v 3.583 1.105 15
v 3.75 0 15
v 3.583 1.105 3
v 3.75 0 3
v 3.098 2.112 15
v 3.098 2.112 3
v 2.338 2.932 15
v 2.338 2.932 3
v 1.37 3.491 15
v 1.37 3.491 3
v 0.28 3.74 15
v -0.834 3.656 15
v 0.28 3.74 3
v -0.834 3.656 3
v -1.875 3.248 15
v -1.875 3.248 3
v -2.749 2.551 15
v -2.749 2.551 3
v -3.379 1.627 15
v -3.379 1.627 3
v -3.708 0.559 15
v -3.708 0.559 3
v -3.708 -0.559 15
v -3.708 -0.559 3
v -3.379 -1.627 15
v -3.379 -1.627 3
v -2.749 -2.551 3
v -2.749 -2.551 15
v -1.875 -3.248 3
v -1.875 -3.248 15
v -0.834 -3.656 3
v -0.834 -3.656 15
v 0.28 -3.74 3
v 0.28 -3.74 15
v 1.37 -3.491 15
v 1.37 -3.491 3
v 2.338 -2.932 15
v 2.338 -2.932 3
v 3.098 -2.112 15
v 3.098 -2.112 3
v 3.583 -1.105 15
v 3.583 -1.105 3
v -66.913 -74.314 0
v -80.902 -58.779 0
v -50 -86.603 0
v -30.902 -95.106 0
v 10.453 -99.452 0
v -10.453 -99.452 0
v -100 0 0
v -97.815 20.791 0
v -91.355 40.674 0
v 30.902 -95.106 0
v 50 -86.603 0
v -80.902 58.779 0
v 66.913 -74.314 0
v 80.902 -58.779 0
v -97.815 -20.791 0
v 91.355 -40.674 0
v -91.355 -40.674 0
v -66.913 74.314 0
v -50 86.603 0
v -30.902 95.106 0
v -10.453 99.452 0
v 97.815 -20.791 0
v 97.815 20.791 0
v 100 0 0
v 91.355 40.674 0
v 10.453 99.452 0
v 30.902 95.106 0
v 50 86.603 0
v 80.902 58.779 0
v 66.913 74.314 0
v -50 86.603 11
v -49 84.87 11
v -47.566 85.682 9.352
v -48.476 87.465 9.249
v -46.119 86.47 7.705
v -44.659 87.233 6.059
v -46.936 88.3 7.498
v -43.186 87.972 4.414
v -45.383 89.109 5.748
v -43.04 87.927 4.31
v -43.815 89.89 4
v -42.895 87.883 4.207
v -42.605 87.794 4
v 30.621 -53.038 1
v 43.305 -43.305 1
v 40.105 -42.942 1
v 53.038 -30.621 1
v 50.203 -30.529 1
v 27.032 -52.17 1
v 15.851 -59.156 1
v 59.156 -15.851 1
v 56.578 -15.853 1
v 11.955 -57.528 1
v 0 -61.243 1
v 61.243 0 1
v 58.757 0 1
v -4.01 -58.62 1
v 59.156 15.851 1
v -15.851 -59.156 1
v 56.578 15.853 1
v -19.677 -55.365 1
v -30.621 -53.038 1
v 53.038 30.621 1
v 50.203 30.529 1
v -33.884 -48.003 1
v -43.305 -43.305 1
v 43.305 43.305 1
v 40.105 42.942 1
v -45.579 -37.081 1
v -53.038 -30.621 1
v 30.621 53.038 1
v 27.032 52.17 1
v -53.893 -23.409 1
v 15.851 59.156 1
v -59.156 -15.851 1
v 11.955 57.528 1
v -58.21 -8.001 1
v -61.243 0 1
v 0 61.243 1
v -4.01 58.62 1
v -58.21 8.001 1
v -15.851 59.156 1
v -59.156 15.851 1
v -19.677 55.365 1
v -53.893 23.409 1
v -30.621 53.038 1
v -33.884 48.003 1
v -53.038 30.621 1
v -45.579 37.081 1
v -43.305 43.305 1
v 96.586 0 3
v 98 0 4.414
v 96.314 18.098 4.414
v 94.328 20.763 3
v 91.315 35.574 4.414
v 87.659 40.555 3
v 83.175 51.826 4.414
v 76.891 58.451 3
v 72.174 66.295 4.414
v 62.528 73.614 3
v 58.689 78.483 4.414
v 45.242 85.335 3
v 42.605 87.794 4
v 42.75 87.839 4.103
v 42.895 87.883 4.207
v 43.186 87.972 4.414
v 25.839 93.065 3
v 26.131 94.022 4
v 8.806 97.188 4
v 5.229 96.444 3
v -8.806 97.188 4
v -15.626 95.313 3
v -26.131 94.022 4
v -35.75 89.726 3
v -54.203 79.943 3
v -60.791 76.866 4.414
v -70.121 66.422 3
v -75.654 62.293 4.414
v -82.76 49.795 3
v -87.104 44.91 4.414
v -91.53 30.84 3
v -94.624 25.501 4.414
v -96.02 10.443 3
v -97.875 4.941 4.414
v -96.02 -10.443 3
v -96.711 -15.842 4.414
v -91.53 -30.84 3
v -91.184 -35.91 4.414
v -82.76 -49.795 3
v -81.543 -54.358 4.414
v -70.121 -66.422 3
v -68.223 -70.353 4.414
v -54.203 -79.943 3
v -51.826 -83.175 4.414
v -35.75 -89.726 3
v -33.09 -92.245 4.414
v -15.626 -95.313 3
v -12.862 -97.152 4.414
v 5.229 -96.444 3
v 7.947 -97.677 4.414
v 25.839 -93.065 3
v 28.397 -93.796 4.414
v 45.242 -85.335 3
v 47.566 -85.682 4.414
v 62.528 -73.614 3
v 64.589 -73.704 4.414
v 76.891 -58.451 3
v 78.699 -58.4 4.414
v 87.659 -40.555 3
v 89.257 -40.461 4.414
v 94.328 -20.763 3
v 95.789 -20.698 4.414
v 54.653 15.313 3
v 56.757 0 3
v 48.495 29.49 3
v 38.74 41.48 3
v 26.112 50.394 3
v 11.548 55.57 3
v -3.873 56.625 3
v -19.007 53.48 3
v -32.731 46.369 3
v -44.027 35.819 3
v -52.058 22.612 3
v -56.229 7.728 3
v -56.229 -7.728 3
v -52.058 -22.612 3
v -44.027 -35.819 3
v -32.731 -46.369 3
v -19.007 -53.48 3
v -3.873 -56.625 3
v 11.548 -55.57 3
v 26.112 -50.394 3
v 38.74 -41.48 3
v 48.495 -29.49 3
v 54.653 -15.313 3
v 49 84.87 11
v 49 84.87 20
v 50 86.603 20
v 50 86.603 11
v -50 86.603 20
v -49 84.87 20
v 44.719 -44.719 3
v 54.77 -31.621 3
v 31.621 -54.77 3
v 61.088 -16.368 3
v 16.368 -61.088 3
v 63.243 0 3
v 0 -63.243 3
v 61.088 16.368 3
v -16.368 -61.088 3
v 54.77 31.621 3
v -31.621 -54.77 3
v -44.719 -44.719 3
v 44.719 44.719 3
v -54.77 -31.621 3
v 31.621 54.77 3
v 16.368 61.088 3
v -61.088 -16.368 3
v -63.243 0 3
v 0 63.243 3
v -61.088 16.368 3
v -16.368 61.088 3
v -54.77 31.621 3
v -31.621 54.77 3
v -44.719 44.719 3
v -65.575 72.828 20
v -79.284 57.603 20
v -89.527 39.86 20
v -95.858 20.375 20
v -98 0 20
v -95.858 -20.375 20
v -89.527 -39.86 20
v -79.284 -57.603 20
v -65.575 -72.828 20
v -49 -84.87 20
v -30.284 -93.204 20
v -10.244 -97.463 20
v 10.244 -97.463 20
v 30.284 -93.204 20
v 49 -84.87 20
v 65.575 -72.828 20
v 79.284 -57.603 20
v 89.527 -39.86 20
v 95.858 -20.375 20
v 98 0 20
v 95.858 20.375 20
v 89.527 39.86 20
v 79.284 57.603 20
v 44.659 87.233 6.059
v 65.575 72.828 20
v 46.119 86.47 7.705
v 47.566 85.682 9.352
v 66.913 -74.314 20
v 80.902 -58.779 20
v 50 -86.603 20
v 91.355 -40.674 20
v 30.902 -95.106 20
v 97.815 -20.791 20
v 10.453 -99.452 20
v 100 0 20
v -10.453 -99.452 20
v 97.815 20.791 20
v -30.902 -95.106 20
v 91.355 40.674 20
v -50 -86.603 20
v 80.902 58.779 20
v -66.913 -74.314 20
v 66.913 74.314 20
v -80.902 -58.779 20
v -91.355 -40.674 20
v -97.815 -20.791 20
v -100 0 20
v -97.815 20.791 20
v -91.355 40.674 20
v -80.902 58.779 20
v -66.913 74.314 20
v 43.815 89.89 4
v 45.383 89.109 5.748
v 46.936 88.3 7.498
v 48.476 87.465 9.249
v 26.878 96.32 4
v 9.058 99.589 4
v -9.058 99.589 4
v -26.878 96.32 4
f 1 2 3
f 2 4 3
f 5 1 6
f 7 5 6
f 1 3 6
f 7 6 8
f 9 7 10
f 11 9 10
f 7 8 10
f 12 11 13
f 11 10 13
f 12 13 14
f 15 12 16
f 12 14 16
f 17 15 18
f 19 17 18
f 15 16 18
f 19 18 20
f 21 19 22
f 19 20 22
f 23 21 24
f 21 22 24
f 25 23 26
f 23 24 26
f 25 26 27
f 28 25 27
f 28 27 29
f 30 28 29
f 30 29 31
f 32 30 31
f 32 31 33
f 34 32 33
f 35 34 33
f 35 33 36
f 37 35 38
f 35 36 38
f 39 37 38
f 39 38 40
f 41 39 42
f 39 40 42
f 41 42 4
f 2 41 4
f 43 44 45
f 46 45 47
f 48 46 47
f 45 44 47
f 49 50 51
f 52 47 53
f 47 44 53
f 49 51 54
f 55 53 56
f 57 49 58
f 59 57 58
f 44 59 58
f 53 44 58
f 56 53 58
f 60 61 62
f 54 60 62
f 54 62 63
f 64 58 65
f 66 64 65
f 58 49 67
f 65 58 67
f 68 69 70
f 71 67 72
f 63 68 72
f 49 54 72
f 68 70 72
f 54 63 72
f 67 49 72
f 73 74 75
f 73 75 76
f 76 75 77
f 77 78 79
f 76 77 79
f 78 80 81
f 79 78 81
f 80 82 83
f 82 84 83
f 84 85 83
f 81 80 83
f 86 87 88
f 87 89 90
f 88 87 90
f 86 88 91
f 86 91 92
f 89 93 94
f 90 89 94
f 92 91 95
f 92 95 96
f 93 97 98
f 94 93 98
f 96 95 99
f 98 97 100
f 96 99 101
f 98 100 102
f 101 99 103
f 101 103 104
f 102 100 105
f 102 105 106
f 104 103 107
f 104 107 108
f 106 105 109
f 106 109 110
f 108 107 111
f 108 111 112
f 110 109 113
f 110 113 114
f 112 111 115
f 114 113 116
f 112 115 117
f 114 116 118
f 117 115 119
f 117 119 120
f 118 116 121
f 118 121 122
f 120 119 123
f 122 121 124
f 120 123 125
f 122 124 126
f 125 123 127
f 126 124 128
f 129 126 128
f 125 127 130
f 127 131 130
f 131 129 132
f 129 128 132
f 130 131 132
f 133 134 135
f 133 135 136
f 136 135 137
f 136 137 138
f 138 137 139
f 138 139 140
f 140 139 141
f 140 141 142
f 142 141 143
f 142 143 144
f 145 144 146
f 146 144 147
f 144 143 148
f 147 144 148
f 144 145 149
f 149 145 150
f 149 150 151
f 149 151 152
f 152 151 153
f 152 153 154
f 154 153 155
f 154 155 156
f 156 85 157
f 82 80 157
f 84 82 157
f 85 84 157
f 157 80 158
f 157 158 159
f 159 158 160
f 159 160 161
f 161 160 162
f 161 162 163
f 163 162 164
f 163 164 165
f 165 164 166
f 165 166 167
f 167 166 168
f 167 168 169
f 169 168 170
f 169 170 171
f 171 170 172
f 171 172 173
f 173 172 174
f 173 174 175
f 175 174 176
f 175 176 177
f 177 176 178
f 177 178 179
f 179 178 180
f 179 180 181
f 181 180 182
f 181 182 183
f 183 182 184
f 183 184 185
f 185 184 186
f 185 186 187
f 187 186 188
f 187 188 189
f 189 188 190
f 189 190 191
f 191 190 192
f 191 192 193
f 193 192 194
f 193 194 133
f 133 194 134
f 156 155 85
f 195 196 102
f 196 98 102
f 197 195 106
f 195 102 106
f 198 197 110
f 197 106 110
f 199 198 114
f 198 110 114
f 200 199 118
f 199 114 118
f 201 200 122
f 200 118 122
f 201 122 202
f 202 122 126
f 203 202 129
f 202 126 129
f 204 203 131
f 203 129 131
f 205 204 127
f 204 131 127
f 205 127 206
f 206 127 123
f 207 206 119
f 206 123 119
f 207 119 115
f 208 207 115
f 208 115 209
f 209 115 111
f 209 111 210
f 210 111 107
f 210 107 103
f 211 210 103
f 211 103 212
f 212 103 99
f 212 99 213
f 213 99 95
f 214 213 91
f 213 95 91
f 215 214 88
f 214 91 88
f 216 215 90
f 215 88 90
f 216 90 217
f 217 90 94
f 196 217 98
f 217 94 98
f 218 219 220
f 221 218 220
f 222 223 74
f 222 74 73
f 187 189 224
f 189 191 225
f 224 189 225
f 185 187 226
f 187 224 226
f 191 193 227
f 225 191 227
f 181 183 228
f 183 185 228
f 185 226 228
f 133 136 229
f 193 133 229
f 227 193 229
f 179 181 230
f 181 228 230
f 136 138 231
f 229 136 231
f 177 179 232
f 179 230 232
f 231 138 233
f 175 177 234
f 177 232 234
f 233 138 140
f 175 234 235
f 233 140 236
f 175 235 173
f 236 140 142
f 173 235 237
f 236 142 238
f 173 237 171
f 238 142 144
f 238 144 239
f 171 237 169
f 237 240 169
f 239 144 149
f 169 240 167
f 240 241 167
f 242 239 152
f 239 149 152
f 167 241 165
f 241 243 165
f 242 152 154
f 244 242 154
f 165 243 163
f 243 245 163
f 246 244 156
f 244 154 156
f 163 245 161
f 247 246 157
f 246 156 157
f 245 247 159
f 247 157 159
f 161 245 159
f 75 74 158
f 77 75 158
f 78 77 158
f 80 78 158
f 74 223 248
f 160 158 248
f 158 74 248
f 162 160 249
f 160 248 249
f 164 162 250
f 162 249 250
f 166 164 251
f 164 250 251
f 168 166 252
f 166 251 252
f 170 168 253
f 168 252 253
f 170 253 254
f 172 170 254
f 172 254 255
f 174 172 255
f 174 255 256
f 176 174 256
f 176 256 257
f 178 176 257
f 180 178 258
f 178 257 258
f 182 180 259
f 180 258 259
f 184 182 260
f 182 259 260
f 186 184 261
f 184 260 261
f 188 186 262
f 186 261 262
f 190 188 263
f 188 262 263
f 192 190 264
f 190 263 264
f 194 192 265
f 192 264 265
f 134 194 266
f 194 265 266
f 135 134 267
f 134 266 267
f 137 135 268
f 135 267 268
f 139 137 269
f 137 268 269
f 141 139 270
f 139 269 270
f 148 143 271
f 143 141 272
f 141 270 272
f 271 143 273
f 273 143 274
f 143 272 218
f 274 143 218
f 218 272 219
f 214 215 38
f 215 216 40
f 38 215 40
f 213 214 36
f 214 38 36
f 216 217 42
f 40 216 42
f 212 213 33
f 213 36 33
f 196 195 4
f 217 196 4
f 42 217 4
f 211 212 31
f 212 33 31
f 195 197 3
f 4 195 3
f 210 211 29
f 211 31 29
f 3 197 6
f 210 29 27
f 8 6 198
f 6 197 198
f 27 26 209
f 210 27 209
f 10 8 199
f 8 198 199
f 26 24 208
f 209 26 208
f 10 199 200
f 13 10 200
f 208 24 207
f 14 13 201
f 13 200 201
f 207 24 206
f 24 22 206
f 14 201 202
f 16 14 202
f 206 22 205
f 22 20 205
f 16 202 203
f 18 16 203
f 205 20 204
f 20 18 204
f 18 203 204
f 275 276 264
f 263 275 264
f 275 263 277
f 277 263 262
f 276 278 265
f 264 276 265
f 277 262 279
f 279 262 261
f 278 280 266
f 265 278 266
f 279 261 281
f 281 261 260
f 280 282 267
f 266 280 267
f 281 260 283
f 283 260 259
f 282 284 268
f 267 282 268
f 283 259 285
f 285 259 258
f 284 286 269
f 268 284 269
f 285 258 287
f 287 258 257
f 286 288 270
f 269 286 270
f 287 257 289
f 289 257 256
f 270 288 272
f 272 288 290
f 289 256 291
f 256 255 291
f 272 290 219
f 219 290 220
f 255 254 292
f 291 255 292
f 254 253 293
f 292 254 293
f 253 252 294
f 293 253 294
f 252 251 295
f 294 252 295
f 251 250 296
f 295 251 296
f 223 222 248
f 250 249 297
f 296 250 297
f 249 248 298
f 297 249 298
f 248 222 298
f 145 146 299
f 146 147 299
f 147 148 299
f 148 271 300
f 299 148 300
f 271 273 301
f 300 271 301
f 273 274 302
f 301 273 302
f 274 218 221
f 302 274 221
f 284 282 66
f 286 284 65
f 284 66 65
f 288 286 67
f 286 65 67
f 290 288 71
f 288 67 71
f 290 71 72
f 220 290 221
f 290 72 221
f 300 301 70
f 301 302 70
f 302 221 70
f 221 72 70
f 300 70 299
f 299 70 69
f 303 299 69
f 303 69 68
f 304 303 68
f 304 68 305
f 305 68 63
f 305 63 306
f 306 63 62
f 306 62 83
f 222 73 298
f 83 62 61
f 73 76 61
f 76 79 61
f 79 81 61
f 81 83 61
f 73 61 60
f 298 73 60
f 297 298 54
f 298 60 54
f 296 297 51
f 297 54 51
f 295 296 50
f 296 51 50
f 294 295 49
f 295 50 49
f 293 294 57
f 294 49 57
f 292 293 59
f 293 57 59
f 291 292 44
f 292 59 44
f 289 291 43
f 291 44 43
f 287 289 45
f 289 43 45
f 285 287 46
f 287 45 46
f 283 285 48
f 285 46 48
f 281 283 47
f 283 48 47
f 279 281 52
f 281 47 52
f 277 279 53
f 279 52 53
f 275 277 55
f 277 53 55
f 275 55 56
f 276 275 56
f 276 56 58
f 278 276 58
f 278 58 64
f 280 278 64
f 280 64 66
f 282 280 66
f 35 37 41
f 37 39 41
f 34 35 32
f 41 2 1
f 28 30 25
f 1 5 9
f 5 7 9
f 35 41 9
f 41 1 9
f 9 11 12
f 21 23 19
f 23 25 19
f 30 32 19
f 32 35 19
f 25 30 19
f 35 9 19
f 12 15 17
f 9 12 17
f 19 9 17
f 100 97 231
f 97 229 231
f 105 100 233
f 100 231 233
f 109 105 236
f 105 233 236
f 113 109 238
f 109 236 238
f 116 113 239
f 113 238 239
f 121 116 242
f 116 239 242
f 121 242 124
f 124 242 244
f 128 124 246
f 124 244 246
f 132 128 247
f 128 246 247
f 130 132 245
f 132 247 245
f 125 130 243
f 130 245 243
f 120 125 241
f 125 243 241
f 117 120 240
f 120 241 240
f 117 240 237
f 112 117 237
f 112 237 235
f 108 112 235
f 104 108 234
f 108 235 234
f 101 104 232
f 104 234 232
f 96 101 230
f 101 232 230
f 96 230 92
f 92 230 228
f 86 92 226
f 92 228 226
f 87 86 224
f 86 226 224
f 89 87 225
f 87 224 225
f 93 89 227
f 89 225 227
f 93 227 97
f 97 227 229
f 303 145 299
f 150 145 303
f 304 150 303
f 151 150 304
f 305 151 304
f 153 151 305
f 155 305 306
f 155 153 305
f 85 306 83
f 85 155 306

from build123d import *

# Parameters (mm, degrees)
POCKET_DEPTH = 20
CHAMFER_SIZE = 7


with BuildPart() as part:
    # Sketch → Revolution (revolve)
    with BuildSketch(Plane.XZ):
        Polygon((0, 0), (0, 15), (3.75, 15), (3.75, 3), (56.757359, 3), (58.757359, 1), (61.242641, 1), (63.242641, 3), (96.585786, 3), (98, 4.414214), (98, 20), (100, 20), (100, 0), align=None)
    revolve(axis=Axis((0, 0, 0), (0, 0, 1)))

    # Sketch001 (on DatumPlane) → Pocket (cut)
    with BuildSketch(Plane(origin=(0, 0, 4), x_dir=(-1, 0, 0), z_dir=(0, 0, 1))):
        with BuildLine():
            ThreePointArc((-60, -103.923048), (0, -120), (60, -103.923048))
            Line((32.5, -56.291651), (60, -103.923048))
            ThreePointArc((-32.5, -56.291651), (0, -65), (32.5, -56.291651))
            Line((-32.5, -56.291651), (-60, -103.923048))
        make_face()
    extrude(amount=POCKET_DEPTH, mode=Mode.SUBTRACT)

    # Chamfer
    chamfer_edges = [part.edges().sort_by_distance(p)[0] for p in [
        (-49.396447, 85.557155, 4),
        (49.396447, 85.557155, 4),
    ]]
    chamfer(chamfer_edges, length=CHAMFER_SIZE)


solid = part.part
